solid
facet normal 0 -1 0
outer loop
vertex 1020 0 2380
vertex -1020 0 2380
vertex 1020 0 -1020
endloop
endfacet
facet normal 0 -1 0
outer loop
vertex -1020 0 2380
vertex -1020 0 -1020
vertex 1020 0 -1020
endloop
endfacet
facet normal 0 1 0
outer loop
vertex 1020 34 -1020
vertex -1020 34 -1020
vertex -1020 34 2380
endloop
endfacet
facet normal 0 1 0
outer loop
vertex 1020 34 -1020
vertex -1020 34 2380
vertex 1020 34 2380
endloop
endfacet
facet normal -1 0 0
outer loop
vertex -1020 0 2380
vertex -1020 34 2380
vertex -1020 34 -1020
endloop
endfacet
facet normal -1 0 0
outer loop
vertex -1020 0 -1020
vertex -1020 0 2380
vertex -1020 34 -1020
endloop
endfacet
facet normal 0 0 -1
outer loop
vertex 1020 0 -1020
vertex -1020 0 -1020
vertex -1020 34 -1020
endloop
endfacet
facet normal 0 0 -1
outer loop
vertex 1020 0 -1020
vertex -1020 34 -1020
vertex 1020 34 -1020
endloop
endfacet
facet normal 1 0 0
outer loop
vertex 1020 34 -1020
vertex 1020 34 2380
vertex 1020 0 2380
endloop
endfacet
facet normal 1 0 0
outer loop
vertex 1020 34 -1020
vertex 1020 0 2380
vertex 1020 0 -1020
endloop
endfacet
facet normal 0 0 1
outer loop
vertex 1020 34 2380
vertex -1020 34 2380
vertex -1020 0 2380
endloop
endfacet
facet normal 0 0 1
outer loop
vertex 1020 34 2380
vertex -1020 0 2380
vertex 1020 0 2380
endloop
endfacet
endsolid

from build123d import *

# Parameters (mm, degrees)
SKETCH_1_W      = 1200
SKETCH_1_H      = 1200
EXTRUDE_1_DEPTH = 20
SKETCH_6_W      = 1200
SKETCH_6_H      = 800
EXTRUDE_3_DEPTH = 20
SCALE_1_SCALE   = 1.7


with BuildPart() as part:
    # 草图1 → 凸台-拉伸1 (new body)
    with BuildSketch(Plane(origin=(0, 0, 0), x_dir=(1, 0, 0), z_dir=(0, 1, 0))):
        Rectangle(SKETCH_1_W, SKETCH_1_H)
    extrude(amount=EXTRUDE_1_DEPTH)

    # 草图6 → 凸台-拉伸3 (add)
    with BuildSketch(Plane(origin=(0, 20, 0), x_dir=(1, 0, 0), z_dir=(0, 1, 0))):
        with Locations((0, -1000)):
            Rectangle(SKETCH_6_W, SKETCH_6_H)
    extrude(amount=-EXTRUDE_3_DEPTH)


with BuildPart() as part_1:
    # 缩放比例1: scaled about (0, 0, 0)
    add(part.part.scale(SCALE_1_SCALE))


solid = part_1.part
